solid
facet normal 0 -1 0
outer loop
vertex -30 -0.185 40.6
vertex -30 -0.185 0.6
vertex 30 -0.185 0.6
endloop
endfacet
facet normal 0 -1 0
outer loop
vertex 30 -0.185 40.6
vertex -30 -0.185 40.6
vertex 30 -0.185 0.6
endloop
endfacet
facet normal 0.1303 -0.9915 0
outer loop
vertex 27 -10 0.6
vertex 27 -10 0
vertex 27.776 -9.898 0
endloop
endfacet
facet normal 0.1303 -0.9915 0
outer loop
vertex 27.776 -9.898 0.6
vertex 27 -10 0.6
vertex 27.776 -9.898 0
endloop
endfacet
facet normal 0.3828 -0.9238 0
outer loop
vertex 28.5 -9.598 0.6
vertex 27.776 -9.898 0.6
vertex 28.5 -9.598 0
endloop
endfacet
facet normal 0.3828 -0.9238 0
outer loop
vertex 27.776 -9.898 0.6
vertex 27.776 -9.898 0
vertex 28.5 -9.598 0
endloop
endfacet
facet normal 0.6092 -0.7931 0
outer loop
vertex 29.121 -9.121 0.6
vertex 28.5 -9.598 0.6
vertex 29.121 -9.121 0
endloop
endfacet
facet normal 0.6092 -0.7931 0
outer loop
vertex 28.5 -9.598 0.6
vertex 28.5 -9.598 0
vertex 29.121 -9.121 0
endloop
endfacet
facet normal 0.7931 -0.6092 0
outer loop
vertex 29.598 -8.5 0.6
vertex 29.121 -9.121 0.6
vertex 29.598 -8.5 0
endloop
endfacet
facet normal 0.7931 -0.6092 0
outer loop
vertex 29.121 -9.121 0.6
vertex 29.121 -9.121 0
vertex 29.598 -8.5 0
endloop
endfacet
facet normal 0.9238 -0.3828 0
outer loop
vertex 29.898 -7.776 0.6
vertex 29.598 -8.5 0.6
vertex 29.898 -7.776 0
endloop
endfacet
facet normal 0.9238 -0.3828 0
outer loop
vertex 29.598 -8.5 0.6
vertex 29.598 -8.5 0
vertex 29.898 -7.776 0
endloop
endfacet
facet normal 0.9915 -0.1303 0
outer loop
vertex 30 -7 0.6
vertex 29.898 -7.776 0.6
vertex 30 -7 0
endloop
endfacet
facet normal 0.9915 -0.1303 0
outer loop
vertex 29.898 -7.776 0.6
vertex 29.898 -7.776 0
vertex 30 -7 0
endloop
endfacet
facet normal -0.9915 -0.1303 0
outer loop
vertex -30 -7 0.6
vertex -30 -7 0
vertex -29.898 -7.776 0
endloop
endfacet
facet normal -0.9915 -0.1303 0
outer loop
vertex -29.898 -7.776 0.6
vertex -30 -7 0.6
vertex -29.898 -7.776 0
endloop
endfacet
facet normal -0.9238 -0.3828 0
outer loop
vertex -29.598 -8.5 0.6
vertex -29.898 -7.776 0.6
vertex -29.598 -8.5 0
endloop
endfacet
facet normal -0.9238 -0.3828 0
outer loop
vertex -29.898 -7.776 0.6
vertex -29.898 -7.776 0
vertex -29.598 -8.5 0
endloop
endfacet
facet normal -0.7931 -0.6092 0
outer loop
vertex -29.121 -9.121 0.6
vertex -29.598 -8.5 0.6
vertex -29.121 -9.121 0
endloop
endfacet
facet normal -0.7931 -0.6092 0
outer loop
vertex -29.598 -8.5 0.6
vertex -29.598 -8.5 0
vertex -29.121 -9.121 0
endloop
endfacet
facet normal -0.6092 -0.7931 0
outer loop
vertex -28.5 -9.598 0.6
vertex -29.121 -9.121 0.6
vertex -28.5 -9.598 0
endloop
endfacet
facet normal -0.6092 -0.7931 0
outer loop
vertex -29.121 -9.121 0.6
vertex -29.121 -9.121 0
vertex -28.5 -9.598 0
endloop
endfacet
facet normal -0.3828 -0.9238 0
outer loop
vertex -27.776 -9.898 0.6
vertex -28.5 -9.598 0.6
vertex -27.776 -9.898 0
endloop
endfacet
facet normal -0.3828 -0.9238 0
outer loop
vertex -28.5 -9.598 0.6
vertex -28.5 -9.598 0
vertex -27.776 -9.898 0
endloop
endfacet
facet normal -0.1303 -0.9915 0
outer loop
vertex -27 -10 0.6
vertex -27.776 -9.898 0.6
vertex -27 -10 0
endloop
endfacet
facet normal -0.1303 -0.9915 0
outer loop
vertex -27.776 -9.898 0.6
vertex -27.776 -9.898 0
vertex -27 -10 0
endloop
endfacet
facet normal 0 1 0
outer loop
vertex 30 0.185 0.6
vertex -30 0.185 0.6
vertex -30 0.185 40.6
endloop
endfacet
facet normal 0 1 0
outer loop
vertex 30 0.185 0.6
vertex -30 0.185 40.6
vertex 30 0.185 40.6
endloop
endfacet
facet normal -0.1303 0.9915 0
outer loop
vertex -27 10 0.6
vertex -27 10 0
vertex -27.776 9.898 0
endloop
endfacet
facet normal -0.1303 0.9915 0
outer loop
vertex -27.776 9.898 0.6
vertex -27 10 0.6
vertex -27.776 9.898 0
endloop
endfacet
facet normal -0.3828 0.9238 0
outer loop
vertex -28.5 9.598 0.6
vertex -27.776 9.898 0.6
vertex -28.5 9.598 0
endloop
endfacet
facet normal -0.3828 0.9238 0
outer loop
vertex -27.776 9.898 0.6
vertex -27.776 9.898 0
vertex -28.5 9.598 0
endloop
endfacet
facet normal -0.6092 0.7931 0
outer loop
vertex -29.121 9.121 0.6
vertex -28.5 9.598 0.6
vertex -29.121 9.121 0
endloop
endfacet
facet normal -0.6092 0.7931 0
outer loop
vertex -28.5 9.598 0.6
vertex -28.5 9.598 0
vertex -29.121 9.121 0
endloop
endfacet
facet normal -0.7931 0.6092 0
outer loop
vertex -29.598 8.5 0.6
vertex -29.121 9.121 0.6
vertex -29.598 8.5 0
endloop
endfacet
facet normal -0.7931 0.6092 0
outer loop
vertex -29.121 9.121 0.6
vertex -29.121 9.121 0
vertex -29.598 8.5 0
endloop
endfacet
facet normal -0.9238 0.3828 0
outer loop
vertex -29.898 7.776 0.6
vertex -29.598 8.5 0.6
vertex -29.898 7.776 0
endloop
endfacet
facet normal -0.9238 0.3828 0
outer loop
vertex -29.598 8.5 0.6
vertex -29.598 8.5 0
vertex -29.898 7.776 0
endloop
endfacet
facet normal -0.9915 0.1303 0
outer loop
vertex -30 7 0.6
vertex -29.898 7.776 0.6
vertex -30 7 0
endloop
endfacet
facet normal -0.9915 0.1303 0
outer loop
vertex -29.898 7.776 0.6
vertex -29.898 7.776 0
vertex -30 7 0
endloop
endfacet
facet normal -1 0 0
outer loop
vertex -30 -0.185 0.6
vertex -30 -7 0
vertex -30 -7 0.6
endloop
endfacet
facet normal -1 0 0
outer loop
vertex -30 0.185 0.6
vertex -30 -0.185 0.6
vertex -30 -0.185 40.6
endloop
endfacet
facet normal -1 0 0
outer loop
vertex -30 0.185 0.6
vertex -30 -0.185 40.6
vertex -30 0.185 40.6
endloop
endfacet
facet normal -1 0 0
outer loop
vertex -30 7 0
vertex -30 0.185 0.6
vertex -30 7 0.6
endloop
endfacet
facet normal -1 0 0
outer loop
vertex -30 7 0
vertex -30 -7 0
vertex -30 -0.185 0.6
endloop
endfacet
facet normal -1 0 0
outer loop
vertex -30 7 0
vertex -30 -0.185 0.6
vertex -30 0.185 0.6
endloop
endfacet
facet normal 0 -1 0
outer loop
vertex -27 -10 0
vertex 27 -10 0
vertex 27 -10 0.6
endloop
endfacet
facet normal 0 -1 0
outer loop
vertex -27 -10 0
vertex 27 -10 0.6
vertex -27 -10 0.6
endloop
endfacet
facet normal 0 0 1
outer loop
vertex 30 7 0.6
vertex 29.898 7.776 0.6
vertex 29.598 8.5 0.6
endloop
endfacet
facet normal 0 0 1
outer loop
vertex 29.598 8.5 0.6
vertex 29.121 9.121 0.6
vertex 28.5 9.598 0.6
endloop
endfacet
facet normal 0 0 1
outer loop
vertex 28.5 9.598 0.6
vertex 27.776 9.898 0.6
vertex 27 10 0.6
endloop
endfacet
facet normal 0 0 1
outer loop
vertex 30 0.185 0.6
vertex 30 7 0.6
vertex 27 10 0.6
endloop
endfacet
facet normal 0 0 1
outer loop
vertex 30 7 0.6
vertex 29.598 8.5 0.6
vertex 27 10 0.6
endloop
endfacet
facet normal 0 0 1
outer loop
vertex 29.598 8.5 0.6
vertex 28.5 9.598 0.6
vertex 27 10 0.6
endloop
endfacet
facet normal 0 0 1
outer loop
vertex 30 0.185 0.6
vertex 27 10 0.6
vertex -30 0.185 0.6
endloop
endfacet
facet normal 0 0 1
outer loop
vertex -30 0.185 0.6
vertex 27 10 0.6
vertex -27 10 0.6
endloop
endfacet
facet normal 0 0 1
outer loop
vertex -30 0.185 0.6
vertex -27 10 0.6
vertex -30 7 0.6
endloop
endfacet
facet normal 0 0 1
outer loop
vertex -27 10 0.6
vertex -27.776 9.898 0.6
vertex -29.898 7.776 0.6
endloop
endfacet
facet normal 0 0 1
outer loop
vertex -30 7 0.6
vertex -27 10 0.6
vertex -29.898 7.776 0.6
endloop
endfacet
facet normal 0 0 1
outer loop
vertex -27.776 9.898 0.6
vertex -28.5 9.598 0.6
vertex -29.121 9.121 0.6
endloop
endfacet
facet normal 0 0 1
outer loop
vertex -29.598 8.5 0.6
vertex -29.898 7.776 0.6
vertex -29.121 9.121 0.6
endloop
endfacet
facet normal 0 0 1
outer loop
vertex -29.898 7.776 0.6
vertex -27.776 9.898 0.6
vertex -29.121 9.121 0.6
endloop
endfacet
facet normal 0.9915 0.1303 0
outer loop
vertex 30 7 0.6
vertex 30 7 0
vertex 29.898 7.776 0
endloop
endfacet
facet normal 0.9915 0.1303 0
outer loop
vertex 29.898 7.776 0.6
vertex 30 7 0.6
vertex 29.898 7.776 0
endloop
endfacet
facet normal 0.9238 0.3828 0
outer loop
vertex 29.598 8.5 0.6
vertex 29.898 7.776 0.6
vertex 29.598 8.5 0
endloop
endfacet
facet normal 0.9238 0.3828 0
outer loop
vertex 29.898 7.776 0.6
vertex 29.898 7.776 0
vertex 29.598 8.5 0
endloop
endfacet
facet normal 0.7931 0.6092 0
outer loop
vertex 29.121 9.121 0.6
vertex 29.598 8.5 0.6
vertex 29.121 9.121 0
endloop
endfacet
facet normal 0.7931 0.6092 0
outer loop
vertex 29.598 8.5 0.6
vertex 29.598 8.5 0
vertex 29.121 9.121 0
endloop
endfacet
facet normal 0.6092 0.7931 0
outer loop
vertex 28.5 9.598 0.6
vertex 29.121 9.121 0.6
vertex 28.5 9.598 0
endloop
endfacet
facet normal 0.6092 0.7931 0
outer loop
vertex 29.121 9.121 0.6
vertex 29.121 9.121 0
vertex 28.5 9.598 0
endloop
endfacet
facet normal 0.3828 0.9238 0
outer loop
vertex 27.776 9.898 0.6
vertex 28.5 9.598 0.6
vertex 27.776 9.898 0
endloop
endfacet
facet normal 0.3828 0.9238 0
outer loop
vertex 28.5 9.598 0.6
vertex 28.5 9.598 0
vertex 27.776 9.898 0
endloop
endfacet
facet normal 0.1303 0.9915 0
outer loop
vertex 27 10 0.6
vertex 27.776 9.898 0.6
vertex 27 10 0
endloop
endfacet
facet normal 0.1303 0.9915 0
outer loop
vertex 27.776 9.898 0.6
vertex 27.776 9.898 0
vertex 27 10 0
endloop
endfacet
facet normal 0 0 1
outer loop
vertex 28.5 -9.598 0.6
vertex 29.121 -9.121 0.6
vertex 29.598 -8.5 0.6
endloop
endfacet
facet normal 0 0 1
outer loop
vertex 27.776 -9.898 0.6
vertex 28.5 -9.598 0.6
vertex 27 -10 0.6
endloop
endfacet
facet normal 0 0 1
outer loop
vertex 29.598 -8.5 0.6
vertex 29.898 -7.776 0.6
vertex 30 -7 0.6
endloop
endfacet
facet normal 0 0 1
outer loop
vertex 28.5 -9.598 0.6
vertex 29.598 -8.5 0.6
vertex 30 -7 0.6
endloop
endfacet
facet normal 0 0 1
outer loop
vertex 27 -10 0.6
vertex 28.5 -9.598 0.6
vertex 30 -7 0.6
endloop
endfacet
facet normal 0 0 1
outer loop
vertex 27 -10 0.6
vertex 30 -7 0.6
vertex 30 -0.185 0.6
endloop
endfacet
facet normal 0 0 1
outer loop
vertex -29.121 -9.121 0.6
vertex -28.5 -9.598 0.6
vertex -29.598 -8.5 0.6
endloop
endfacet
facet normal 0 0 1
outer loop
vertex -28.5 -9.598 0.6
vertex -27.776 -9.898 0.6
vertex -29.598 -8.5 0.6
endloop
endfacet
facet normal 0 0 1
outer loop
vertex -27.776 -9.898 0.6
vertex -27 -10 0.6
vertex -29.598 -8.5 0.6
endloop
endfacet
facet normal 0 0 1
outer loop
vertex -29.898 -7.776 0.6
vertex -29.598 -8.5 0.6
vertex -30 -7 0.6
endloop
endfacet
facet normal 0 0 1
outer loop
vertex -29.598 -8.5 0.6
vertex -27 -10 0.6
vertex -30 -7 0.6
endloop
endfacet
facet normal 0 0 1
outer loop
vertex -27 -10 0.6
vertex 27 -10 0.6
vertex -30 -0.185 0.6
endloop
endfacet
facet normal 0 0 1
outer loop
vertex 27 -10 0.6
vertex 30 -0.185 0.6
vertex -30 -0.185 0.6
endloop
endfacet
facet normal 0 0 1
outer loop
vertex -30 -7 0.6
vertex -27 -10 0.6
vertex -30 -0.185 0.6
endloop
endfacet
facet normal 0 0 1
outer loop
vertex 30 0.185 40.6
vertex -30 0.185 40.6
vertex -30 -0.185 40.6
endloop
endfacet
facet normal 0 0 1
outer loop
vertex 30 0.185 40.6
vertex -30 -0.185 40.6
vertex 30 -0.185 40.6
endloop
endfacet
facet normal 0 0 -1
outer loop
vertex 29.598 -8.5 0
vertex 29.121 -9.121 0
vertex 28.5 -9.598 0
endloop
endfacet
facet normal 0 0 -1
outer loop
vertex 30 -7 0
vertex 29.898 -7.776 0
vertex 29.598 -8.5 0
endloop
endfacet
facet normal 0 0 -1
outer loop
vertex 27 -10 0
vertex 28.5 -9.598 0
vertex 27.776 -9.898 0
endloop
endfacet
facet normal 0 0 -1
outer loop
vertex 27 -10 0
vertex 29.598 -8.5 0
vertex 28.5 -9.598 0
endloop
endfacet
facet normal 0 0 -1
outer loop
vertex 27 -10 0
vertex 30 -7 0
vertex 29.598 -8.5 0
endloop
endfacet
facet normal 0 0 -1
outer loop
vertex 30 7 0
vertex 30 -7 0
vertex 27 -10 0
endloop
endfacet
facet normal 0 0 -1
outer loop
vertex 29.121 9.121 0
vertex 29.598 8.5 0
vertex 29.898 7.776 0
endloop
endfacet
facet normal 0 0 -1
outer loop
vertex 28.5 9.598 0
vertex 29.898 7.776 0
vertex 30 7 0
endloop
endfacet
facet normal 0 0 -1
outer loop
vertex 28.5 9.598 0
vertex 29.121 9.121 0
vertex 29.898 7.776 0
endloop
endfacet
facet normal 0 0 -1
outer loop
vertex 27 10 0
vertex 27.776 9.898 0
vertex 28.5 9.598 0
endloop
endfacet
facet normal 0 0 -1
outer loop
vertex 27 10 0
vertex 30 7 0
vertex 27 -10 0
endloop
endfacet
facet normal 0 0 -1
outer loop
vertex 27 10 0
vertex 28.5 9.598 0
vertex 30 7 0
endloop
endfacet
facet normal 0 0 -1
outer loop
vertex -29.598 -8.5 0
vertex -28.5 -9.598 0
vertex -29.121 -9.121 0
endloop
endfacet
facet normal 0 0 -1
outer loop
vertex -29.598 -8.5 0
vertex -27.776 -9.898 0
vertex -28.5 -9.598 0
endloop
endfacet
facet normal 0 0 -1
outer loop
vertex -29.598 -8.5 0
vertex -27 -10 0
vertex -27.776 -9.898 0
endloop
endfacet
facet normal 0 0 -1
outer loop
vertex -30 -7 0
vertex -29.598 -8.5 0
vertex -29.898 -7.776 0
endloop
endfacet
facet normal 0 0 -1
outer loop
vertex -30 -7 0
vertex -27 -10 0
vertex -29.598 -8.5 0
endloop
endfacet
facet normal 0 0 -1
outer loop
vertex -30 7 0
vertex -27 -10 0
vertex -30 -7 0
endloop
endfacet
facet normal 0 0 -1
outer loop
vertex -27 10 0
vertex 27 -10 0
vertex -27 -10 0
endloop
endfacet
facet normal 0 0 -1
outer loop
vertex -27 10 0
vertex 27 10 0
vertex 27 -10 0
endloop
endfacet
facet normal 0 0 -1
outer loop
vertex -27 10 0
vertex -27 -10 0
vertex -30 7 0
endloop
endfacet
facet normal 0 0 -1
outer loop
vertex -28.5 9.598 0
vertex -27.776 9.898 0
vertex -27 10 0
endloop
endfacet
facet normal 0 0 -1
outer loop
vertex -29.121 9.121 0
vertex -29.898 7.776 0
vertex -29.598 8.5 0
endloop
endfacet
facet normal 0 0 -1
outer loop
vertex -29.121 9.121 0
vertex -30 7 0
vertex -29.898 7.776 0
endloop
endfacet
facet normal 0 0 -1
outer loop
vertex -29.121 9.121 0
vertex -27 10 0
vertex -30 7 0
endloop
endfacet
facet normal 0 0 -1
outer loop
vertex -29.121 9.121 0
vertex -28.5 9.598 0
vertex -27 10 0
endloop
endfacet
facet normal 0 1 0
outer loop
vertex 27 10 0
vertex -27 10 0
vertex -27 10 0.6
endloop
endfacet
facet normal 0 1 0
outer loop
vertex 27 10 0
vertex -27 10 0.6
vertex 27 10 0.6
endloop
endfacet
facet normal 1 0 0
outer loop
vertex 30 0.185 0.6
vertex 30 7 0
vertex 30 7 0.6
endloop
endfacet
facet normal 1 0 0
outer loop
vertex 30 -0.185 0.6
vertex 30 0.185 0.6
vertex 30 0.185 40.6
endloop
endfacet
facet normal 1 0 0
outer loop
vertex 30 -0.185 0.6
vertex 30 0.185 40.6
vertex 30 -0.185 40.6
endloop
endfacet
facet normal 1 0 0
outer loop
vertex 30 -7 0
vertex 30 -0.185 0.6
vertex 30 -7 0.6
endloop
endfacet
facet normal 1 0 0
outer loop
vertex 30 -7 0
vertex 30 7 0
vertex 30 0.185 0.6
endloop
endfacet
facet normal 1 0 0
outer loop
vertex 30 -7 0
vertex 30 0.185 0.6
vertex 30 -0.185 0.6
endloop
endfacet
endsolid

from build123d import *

# Parameters (mm, degrees)
PAD_DEPTH    = 0.6
SKETCH001_W  = 60
SKETCH001_H  = 0.37
PAD001_DEPTH = 40


with BuildPart() as part:
    # Sketch → Pad (new body)
    with BuildSketch(Plane.XY):
        with BuildLine():
            Line((-27, 10), (27, 10))
            ThreePointArc((30, 7), (29.12132, 9.12132), (27, 10))
            Line((30, 7), (30, -7))
            ThreePointArc((27, -10), (29.12132, -9.12132), (30, -7))
            Line((27, -10), (-27, -10))
            ThreePointArc((-30, -7), (-29.12132, -9.12132), (-27, -10))
            Line((-30, -7), (-30, 7))
            ThreePointArc((-27, 10), (-29.12132, 9.12132), (-30, 7))
        make_face()
    extrude(amount=PAD_DEPTH)

    # Sketch001 → Pad001 (join)
    with BuildSketch(Plane.XY.offset(0.6)):
        Rectangle(SKETCH001_W, SKETCH001_H)
    extrude(amount=PAD001_DEPTH)


solid = part.part
